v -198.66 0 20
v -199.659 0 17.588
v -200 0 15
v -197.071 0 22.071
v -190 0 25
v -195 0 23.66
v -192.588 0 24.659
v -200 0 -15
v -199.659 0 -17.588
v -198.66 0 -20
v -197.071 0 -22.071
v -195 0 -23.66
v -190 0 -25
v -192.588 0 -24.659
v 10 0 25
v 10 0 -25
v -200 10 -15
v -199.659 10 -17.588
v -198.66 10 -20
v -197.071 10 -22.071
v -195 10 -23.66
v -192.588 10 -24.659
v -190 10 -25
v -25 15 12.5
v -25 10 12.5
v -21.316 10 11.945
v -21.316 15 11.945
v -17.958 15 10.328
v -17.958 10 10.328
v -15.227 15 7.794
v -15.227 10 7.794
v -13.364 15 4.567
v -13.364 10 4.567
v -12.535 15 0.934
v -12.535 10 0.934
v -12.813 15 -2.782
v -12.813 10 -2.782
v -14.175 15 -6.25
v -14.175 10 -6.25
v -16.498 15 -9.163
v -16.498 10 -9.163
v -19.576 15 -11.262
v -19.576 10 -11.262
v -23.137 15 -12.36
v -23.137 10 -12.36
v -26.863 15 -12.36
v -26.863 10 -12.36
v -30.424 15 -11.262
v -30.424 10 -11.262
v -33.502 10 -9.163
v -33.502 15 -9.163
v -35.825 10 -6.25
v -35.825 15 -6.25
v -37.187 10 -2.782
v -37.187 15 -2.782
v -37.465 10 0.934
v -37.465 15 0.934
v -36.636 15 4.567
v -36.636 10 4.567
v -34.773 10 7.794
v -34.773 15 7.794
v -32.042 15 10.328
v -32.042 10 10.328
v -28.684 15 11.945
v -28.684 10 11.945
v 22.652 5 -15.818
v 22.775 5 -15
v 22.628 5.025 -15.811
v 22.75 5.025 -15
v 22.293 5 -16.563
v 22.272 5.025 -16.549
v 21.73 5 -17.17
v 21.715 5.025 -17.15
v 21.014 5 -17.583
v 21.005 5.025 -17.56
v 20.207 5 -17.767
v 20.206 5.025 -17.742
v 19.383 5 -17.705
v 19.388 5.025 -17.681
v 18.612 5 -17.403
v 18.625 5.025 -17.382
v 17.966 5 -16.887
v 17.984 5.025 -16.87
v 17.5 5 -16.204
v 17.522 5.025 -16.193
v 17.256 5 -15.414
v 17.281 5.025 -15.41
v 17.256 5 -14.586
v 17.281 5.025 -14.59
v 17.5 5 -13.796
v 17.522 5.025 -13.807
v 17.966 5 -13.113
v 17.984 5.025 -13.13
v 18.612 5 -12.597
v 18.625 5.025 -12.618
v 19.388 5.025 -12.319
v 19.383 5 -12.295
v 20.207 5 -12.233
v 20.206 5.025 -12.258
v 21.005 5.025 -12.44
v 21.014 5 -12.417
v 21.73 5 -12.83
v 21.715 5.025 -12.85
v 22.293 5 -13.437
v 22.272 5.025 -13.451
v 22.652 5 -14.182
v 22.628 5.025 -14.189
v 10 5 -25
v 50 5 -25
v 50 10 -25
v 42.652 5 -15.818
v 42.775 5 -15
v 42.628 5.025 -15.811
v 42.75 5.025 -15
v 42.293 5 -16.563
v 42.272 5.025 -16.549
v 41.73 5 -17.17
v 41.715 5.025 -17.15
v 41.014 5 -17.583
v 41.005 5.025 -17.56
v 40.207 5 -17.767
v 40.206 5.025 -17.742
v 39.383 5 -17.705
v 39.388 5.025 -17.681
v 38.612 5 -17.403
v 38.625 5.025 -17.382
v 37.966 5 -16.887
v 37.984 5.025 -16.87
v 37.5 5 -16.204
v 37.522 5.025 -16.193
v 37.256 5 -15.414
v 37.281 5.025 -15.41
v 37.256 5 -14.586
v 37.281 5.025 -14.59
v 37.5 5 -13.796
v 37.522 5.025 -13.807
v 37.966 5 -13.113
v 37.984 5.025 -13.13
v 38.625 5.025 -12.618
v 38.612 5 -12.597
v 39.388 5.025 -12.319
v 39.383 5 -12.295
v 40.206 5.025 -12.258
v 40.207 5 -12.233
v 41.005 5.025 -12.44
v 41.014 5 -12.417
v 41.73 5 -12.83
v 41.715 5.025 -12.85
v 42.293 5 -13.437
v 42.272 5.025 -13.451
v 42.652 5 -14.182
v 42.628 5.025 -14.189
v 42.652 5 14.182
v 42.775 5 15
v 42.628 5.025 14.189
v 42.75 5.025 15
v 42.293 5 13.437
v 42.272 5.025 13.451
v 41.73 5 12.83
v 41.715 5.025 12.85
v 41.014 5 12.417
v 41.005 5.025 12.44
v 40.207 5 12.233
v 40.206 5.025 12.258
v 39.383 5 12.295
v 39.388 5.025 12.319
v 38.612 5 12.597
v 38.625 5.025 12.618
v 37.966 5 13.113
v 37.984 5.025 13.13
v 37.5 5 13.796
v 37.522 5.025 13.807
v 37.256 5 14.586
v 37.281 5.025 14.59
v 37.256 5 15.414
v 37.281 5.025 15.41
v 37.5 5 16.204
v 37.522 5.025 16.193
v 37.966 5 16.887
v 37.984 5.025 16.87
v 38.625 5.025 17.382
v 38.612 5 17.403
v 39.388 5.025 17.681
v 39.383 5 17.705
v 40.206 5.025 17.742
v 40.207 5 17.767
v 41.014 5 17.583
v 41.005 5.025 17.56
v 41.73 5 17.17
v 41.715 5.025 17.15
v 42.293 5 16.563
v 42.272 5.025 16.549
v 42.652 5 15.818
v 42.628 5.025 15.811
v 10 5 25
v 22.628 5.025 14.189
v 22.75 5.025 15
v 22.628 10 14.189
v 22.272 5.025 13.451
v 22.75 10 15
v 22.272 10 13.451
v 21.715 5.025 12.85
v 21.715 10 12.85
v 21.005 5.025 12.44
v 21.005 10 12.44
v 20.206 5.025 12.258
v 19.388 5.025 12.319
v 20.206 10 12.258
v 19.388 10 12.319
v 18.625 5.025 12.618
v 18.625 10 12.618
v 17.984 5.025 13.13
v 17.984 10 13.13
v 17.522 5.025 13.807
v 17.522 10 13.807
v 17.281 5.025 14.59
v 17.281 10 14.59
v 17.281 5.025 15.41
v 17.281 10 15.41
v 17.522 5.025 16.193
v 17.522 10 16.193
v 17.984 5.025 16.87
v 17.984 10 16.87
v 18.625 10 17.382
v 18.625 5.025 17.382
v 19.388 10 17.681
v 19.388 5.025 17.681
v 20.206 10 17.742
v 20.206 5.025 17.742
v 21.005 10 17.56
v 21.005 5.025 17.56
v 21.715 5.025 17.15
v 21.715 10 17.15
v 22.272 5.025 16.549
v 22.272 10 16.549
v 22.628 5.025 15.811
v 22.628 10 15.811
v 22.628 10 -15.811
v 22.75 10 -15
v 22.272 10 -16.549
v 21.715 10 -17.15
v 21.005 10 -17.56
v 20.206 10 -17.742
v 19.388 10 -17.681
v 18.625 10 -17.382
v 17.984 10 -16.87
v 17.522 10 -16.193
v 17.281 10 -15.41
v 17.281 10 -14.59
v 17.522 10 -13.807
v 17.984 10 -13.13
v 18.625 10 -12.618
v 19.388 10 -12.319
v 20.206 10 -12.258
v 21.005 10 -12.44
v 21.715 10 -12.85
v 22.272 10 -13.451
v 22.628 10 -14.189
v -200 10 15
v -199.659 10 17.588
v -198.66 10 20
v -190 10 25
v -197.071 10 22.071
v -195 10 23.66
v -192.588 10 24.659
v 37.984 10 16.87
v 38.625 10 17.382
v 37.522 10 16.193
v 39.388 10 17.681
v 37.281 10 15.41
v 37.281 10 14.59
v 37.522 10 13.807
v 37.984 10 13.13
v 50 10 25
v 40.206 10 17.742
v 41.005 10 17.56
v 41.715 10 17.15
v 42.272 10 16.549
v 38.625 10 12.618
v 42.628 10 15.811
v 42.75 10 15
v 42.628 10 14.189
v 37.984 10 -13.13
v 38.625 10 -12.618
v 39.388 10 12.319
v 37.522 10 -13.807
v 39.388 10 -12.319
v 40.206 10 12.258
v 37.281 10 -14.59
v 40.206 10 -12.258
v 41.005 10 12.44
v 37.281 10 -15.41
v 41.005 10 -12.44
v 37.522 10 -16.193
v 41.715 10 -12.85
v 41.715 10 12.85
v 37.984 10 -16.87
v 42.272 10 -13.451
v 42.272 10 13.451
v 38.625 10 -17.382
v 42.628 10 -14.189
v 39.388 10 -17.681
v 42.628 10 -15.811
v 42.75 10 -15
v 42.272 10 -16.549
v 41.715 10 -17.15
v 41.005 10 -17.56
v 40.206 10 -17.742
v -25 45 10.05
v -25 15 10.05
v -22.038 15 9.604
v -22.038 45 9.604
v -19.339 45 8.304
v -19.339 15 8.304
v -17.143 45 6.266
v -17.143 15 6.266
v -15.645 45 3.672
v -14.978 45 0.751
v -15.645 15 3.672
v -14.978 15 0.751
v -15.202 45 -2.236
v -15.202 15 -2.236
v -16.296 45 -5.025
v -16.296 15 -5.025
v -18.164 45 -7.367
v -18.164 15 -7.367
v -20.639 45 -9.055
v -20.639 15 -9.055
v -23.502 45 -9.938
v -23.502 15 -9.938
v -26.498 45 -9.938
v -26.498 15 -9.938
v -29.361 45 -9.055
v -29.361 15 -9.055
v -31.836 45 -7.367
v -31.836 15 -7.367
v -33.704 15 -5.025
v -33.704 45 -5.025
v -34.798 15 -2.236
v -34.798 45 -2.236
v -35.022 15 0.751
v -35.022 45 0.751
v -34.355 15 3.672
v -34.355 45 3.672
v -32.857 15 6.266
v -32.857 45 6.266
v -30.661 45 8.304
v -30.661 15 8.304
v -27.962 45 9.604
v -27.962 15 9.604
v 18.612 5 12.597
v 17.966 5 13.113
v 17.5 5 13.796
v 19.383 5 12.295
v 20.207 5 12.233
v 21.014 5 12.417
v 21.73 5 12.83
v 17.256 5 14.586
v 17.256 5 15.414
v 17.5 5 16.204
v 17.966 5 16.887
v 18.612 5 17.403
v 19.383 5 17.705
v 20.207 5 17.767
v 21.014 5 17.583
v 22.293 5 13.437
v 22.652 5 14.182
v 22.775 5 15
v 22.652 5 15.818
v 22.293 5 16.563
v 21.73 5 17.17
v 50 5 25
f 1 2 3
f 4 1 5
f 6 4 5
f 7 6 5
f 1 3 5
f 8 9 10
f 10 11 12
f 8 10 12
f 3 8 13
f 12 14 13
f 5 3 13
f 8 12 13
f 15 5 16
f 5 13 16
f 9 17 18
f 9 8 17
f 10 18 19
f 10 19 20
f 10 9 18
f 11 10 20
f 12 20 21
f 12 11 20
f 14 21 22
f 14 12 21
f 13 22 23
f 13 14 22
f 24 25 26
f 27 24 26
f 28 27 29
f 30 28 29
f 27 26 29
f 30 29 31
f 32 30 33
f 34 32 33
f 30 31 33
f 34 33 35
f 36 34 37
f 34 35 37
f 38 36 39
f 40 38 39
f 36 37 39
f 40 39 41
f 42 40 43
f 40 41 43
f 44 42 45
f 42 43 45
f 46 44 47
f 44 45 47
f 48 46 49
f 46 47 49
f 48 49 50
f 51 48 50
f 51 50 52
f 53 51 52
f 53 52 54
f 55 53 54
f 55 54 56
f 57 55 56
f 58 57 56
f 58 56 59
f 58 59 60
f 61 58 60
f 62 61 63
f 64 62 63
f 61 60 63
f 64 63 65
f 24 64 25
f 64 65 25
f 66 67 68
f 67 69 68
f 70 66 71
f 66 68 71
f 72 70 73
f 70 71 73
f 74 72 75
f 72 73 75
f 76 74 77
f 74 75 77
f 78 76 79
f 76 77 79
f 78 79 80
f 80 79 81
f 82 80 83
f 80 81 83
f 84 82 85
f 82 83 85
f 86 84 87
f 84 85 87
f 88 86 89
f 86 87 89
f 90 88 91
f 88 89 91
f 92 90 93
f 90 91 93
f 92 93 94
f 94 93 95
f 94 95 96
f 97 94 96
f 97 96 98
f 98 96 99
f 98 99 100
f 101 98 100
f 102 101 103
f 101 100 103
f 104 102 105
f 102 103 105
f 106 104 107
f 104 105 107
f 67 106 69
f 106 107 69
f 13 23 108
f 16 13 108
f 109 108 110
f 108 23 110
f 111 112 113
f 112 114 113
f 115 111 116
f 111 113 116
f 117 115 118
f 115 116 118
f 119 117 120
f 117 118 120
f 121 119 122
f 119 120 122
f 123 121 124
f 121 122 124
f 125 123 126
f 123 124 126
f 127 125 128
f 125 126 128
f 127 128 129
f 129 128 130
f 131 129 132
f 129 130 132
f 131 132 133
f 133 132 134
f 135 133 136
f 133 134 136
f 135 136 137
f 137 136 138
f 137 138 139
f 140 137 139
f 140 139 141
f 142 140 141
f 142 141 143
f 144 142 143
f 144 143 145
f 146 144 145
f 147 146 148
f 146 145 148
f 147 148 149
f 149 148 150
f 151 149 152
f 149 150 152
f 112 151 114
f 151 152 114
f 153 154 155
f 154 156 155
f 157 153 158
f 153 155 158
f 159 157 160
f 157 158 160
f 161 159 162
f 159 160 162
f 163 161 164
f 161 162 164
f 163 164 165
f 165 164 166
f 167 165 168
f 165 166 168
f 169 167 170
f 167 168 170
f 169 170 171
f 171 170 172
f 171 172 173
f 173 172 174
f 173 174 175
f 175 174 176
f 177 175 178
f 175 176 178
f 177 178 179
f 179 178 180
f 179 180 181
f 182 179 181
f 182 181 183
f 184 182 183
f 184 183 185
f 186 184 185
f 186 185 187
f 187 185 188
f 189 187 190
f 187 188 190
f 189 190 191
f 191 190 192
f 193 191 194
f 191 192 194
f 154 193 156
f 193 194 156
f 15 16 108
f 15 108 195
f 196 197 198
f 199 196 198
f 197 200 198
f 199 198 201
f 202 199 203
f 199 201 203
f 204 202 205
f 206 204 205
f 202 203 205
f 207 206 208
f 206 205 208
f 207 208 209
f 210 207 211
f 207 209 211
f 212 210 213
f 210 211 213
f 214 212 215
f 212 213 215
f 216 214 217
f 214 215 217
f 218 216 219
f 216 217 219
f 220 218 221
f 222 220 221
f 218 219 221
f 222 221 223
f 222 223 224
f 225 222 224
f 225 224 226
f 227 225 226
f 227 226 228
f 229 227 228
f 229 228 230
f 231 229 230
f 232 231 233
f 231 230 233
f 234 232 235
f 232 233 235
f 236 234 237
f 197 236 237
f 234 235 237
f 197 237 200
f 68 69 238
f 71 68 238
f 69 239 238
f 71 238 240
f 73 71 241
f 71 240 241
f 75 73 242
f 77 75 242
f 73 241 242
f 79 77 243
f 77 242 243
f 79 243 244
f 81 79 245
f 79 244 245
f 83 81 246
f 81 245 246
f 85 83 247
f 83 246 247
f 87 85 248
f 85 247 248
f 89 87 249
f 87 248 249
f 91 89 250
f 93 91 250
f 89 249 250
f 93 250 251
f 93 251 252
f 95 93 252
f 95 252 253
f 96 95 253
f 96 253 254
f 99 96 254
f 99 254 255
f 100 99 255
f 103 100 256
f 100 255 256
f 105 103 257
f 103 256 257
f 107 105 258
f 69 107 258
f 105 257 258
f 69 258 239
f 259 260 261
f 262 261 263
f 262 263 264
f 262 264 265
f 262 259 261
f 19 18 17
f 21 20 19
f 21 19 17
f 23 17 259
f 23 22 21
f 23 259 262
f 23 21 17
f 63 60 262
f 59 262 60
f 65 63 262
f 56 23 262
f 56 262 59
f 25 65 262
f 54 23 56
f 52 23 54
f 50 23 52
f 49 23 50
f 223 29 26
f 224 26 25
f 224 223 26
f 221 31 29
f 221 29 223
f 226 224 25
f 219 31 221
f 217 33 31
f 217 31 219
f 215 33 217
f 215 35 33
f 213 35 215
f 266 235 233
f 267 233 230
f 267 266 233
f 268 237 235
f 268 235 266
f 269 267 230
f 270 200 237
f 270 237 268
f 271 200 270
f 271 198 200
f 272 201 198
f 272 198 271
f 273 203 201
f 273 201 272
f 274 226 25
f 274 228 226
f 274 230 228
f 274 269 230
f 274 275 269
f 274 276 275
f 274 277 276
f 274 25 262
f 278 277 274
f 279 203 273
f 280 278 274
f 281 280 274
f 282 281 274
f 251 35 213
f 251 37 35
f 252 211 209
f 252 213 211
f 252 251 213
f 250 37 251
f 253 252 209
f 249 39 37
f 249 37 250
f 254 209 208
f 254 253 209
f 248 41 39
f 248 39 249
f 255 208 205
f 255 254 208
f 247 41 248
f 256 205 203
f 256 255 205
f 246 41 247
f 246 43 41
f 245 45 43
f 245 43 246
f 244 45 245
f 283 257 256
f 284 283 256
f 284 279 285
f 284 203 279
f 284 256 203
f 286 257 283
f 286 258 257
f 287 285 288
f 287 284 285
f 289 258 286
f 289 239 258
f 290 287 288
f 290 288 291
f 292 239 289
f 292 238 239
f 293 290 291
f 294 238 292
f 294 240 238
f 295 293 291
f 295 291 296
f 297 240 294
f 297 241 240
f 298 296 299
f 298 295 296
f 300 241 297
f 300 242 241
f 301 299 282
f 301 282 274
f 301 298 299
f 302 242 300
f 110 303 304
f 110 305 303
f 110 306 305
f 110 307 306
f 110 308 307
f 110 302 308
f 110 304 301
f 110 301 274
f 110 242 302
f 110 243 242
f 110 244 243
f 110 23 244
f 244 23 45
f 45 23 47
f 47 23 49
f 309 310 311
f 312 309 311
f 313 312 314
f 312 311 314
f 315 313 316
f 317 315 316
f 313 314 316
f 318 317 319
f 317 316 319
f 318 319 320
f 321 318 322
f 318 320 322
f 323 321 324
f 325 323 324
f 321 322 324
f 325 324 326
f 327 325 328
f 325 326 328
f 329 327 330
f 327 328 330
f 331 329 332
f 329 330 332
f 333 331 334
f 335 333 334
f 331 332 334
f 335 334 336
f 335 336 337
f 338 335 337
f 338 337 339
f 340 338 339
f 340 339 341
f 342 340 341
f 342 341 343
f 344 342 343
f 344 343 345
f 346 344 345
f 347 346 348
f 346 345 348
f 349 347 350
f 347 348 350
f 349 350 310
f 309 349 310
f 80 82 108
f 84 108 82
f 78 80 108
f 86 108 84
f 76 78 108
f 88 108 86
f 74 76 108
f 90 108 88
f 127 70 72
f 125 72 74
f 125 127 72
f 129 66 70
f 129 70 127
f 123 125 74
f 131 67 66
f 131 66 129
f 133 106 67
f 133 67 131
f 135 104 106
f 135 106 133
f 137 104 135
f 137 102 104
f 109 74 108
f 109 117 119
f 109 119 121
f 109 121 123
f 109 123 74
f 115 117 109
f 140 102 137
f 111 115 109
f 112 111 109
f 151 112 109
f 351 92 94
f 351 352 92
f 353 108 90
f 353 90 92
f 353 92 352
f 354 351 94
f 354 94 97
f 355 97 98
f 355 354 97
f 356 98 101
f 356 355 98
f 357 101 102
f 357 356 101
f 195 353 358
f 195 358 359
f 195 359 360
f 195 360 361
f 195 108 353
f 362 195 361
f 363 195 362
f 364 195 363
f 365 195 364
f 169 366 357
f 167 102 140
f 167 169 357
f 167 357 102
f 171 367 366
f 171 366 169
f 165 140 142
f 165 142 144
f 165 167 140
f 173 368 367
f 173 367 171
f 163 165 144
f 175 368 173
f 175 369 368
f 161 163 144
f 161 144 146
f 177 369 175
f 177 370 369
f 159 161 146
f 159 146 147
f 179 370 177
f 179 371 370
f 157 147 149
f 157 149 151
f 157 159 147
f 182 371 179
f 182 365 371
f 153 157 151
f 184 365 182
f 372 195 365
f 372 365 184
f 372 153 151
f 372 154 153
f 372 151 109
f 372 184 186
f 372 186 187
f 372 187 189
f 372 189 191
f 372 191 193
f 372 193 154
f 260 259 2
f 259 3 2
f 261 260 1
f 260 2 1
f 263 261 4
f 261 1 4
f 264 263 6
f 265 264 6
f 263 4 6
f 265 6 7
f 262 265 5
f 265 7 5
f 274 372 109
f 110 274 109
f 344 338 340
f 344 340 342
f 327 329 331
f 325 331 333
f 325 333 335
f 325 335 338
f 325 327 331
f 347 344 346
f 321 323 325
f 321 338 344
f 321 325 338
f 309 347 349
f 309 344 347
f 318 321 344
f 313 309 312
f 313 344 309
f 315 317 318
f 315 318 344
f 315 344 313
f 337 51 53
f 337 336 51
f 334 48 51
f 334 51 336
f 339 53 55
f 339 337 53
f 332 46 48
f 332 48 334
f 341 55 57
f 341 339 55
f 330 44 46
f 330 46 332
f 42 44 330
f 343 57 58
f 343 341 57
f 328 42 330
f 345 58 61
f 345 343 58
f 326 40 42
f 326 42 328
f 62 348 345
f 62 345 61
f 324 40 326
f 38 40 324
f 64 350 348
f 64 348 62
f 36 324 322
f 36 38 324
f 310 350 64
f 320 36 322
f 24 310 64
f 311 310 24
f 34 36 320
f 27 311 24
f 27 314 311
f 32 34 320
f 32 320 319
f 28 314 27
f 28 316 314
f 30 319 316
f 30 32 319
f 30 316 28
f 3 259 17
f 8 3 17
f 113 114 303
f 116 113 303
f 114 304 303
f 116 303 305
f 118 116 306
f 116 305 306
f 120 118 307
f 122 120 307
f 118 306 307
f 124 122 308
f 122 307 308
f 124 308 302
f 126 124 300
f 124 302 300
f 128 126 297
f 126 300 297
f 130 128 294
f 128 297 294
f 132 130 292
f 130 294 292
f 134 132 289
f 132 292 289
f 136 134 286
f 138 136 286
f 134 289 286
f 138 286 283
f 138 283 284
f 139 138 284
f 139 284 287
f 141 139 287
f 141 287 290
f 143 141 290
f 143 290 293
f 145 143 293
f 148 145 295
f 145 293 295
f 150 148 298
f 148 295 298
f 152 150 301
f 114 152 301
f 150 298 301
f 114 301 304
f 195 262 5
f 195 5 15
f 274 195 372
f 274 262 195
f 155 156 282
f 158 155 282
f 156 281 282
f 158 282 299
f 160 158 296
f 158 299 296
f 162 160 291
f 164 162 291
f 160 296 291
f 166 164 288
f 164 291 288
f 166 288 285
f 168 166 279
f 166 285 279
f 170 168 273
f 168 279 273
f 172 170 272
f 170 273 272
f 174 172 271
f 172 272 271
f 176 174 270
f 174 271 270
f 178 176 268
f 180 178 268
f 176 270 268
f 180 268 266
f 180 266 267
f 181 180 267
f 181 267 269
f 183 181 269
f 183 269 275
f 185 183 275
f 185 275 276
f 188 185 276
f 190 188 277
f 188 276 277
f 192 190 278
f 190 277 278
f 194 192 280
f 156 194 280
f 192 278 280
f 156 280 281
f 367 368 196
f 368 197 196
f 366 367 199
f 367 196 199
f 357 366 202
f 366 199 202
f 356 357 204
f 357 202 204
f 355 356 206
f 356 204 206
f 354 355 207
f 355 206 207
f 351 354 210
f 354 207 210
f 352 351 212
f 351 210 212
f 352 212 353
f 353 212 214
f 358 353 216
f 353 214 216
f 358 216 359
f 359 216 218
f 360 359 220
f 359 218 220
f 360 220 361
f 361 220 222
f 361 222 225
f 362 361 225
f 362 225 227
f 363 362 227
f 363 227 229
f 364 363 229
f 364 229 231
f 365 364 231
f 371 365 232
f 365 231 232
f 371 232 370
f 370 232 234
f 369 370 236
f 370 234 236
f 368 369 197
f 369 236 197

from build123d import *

# Parameters (mm, degrees)
SKETCH1_W           = 100
SKETCH1_H           = 50
BOSS_EXTRUDE1_DEPTH = 10
SKETCH8_W           = 150
SKETCH8_H           = 50
BOSS_EXTRUDE3_DEPTH = 10
SKETCH10_R          = 12.5
BOSS_EXTRUDE4_DEPTH = 5
SKETCH12_R          = 10.05
BOSS_EXTRUDE5_DEPTH = 30
SKETCH13_W          = 40
SKETCH13_H          = 50
CUT_EXTRUDE3_DEPTH  = 5
FILLET1_R           = 10


# Read off the part's stored shape, not the designer's step: M5 Clearance Hole1
with BuildPart() as part:
    # Sketch1 → Boss-Extrude1 (new body)
    with BuildSketch(Plane(origin=(0, 0, 0), x_dir=(1, 0, 0), z_dir=(0, 1, 0))):
        Rectangle(SKETCH1_W, SKETCH1_H)
    extrude(amount=BOSS_EXTRUDE1_DEPTH)

    # Sketch8 → Boss-Extrude3 (add)
    with BuildSketch(Plane(origin=(0, 10, 0), x_dir=(1, 0, 0), z_dir=(0, 1, 0))):
        with Locations((-125, 0)):
            Rectangle(SKETCH8_W, SKETCH8_H)
    extrude(amount=-BOSS_EXTRUDE3_DEPTH)

    # Sketch10 → Boss-Extrude4 (add)
    with BuildSketch(Plane(origin=(0, 10, 0), x_dir=(1, 0, 0), z_dir=(0, 1, 0))):
        with Locations(Location((-25, 0, 0), (0, 0, 270))):
            Circle(SKETCH10_R)
    extrude(amount=BOSS_EXTRUDE4_DEPTH)

    # Sketch12 → Boss-Extrude5 (add)
    with BuildSketch(Plane(origin=(0, 15, 0), x_dir=(1, 0, 0), z_dir=(0, 1, 0))):
        with Locations(Location((-25, 0, 0), (0, 0, 270))):
            Circle(SKETCH12_R)
    extrude(amount=BOSS_EXTRUDE5_DEPTH)

    # Sketch13 → Cut-Extrude3 (cut)
    with BuildSketch(Plane.XZ):
        with Locations((30, 0)):
            Rectangle(SKETCH13_W, SKETCH13_H)
    extrude(amount=-CUT_EXTRUDE3_DEPTH, mode=Mode.SUBTRACT)

    # M5 Clearance Hole1 outline → M5 Clearance Hole1 (revolve, cut)
    with BuildSketch(Plane(origin=(20, 0, -15), x_dir=(1, 0, 0), z_dir=(0, 0, 1))):
        Polygon((2.75, 5.025), (2.75, 10), (0, 10), (0, 5), (2.775, 5), align=None)
    revolve(axis=Axis((20, 0, -15), (0, 1, 0)), mode=Mode.SUBTRACT)

    # M5 Clearance Hole1 2 outline → M5 Clearance Hole1 2 (revolve, cut)
    with BuildSketch(Plane(origin=(20, 0, 15), x_dir=(1, 0, 0), z_dir=(0, 0, 1))):
        Polygon((2.75, 5.025), (2.75, 10), (0, 10), (0, 5), (2.775, 5), align=None)
    revolve(axis=Axis((20, 0, 15), (0, 1, 0)), mode=Mode.SUBTRACT)

    # M5 Clearance Hole1 3 outline → M5 Clearance Hole1 3 (revolve, cut)
    with BuildSketch(Plane(origin=(40, 0, 15), x_dir=(1, 0, 0), z_dir=(0, 0, 1))):
        Polygon((2.75, 5.025), (2.75, 10), (0, 10), (0, 5), (2.775, 5), align=None)
    revolve(axis=Axis((40, 0, 15), (0, 1, 0)), mode=Mode.SUBTRACT)

    # M5 Clearance Hole1 4 outline → M5 Clearance Hole1 4 (revolve, cut)
    with BuildSketch(Plane(origin=(40, 0, -15), x_dir=(1, 0, 0), z_dir=(0, 0, 1))):
        Polygon((2.75, 5.025), (2.75, 10), (0, 10), (0, 5), (2.775, 5), align=None)
    revolve(axis=Axis((40, 0, -15), (0, 1, 0)), mode=Mode.SUBTRACT)

    # Fillet1
    fillet1_edges = [part.edges().sort_by_distance(p)[0] for p in [
        (-200, 5, -25),
        (-200, 5, 25),
    ]]
    fillet(fillet1_edges, radius=FILLET1_R)


solid = part.part
